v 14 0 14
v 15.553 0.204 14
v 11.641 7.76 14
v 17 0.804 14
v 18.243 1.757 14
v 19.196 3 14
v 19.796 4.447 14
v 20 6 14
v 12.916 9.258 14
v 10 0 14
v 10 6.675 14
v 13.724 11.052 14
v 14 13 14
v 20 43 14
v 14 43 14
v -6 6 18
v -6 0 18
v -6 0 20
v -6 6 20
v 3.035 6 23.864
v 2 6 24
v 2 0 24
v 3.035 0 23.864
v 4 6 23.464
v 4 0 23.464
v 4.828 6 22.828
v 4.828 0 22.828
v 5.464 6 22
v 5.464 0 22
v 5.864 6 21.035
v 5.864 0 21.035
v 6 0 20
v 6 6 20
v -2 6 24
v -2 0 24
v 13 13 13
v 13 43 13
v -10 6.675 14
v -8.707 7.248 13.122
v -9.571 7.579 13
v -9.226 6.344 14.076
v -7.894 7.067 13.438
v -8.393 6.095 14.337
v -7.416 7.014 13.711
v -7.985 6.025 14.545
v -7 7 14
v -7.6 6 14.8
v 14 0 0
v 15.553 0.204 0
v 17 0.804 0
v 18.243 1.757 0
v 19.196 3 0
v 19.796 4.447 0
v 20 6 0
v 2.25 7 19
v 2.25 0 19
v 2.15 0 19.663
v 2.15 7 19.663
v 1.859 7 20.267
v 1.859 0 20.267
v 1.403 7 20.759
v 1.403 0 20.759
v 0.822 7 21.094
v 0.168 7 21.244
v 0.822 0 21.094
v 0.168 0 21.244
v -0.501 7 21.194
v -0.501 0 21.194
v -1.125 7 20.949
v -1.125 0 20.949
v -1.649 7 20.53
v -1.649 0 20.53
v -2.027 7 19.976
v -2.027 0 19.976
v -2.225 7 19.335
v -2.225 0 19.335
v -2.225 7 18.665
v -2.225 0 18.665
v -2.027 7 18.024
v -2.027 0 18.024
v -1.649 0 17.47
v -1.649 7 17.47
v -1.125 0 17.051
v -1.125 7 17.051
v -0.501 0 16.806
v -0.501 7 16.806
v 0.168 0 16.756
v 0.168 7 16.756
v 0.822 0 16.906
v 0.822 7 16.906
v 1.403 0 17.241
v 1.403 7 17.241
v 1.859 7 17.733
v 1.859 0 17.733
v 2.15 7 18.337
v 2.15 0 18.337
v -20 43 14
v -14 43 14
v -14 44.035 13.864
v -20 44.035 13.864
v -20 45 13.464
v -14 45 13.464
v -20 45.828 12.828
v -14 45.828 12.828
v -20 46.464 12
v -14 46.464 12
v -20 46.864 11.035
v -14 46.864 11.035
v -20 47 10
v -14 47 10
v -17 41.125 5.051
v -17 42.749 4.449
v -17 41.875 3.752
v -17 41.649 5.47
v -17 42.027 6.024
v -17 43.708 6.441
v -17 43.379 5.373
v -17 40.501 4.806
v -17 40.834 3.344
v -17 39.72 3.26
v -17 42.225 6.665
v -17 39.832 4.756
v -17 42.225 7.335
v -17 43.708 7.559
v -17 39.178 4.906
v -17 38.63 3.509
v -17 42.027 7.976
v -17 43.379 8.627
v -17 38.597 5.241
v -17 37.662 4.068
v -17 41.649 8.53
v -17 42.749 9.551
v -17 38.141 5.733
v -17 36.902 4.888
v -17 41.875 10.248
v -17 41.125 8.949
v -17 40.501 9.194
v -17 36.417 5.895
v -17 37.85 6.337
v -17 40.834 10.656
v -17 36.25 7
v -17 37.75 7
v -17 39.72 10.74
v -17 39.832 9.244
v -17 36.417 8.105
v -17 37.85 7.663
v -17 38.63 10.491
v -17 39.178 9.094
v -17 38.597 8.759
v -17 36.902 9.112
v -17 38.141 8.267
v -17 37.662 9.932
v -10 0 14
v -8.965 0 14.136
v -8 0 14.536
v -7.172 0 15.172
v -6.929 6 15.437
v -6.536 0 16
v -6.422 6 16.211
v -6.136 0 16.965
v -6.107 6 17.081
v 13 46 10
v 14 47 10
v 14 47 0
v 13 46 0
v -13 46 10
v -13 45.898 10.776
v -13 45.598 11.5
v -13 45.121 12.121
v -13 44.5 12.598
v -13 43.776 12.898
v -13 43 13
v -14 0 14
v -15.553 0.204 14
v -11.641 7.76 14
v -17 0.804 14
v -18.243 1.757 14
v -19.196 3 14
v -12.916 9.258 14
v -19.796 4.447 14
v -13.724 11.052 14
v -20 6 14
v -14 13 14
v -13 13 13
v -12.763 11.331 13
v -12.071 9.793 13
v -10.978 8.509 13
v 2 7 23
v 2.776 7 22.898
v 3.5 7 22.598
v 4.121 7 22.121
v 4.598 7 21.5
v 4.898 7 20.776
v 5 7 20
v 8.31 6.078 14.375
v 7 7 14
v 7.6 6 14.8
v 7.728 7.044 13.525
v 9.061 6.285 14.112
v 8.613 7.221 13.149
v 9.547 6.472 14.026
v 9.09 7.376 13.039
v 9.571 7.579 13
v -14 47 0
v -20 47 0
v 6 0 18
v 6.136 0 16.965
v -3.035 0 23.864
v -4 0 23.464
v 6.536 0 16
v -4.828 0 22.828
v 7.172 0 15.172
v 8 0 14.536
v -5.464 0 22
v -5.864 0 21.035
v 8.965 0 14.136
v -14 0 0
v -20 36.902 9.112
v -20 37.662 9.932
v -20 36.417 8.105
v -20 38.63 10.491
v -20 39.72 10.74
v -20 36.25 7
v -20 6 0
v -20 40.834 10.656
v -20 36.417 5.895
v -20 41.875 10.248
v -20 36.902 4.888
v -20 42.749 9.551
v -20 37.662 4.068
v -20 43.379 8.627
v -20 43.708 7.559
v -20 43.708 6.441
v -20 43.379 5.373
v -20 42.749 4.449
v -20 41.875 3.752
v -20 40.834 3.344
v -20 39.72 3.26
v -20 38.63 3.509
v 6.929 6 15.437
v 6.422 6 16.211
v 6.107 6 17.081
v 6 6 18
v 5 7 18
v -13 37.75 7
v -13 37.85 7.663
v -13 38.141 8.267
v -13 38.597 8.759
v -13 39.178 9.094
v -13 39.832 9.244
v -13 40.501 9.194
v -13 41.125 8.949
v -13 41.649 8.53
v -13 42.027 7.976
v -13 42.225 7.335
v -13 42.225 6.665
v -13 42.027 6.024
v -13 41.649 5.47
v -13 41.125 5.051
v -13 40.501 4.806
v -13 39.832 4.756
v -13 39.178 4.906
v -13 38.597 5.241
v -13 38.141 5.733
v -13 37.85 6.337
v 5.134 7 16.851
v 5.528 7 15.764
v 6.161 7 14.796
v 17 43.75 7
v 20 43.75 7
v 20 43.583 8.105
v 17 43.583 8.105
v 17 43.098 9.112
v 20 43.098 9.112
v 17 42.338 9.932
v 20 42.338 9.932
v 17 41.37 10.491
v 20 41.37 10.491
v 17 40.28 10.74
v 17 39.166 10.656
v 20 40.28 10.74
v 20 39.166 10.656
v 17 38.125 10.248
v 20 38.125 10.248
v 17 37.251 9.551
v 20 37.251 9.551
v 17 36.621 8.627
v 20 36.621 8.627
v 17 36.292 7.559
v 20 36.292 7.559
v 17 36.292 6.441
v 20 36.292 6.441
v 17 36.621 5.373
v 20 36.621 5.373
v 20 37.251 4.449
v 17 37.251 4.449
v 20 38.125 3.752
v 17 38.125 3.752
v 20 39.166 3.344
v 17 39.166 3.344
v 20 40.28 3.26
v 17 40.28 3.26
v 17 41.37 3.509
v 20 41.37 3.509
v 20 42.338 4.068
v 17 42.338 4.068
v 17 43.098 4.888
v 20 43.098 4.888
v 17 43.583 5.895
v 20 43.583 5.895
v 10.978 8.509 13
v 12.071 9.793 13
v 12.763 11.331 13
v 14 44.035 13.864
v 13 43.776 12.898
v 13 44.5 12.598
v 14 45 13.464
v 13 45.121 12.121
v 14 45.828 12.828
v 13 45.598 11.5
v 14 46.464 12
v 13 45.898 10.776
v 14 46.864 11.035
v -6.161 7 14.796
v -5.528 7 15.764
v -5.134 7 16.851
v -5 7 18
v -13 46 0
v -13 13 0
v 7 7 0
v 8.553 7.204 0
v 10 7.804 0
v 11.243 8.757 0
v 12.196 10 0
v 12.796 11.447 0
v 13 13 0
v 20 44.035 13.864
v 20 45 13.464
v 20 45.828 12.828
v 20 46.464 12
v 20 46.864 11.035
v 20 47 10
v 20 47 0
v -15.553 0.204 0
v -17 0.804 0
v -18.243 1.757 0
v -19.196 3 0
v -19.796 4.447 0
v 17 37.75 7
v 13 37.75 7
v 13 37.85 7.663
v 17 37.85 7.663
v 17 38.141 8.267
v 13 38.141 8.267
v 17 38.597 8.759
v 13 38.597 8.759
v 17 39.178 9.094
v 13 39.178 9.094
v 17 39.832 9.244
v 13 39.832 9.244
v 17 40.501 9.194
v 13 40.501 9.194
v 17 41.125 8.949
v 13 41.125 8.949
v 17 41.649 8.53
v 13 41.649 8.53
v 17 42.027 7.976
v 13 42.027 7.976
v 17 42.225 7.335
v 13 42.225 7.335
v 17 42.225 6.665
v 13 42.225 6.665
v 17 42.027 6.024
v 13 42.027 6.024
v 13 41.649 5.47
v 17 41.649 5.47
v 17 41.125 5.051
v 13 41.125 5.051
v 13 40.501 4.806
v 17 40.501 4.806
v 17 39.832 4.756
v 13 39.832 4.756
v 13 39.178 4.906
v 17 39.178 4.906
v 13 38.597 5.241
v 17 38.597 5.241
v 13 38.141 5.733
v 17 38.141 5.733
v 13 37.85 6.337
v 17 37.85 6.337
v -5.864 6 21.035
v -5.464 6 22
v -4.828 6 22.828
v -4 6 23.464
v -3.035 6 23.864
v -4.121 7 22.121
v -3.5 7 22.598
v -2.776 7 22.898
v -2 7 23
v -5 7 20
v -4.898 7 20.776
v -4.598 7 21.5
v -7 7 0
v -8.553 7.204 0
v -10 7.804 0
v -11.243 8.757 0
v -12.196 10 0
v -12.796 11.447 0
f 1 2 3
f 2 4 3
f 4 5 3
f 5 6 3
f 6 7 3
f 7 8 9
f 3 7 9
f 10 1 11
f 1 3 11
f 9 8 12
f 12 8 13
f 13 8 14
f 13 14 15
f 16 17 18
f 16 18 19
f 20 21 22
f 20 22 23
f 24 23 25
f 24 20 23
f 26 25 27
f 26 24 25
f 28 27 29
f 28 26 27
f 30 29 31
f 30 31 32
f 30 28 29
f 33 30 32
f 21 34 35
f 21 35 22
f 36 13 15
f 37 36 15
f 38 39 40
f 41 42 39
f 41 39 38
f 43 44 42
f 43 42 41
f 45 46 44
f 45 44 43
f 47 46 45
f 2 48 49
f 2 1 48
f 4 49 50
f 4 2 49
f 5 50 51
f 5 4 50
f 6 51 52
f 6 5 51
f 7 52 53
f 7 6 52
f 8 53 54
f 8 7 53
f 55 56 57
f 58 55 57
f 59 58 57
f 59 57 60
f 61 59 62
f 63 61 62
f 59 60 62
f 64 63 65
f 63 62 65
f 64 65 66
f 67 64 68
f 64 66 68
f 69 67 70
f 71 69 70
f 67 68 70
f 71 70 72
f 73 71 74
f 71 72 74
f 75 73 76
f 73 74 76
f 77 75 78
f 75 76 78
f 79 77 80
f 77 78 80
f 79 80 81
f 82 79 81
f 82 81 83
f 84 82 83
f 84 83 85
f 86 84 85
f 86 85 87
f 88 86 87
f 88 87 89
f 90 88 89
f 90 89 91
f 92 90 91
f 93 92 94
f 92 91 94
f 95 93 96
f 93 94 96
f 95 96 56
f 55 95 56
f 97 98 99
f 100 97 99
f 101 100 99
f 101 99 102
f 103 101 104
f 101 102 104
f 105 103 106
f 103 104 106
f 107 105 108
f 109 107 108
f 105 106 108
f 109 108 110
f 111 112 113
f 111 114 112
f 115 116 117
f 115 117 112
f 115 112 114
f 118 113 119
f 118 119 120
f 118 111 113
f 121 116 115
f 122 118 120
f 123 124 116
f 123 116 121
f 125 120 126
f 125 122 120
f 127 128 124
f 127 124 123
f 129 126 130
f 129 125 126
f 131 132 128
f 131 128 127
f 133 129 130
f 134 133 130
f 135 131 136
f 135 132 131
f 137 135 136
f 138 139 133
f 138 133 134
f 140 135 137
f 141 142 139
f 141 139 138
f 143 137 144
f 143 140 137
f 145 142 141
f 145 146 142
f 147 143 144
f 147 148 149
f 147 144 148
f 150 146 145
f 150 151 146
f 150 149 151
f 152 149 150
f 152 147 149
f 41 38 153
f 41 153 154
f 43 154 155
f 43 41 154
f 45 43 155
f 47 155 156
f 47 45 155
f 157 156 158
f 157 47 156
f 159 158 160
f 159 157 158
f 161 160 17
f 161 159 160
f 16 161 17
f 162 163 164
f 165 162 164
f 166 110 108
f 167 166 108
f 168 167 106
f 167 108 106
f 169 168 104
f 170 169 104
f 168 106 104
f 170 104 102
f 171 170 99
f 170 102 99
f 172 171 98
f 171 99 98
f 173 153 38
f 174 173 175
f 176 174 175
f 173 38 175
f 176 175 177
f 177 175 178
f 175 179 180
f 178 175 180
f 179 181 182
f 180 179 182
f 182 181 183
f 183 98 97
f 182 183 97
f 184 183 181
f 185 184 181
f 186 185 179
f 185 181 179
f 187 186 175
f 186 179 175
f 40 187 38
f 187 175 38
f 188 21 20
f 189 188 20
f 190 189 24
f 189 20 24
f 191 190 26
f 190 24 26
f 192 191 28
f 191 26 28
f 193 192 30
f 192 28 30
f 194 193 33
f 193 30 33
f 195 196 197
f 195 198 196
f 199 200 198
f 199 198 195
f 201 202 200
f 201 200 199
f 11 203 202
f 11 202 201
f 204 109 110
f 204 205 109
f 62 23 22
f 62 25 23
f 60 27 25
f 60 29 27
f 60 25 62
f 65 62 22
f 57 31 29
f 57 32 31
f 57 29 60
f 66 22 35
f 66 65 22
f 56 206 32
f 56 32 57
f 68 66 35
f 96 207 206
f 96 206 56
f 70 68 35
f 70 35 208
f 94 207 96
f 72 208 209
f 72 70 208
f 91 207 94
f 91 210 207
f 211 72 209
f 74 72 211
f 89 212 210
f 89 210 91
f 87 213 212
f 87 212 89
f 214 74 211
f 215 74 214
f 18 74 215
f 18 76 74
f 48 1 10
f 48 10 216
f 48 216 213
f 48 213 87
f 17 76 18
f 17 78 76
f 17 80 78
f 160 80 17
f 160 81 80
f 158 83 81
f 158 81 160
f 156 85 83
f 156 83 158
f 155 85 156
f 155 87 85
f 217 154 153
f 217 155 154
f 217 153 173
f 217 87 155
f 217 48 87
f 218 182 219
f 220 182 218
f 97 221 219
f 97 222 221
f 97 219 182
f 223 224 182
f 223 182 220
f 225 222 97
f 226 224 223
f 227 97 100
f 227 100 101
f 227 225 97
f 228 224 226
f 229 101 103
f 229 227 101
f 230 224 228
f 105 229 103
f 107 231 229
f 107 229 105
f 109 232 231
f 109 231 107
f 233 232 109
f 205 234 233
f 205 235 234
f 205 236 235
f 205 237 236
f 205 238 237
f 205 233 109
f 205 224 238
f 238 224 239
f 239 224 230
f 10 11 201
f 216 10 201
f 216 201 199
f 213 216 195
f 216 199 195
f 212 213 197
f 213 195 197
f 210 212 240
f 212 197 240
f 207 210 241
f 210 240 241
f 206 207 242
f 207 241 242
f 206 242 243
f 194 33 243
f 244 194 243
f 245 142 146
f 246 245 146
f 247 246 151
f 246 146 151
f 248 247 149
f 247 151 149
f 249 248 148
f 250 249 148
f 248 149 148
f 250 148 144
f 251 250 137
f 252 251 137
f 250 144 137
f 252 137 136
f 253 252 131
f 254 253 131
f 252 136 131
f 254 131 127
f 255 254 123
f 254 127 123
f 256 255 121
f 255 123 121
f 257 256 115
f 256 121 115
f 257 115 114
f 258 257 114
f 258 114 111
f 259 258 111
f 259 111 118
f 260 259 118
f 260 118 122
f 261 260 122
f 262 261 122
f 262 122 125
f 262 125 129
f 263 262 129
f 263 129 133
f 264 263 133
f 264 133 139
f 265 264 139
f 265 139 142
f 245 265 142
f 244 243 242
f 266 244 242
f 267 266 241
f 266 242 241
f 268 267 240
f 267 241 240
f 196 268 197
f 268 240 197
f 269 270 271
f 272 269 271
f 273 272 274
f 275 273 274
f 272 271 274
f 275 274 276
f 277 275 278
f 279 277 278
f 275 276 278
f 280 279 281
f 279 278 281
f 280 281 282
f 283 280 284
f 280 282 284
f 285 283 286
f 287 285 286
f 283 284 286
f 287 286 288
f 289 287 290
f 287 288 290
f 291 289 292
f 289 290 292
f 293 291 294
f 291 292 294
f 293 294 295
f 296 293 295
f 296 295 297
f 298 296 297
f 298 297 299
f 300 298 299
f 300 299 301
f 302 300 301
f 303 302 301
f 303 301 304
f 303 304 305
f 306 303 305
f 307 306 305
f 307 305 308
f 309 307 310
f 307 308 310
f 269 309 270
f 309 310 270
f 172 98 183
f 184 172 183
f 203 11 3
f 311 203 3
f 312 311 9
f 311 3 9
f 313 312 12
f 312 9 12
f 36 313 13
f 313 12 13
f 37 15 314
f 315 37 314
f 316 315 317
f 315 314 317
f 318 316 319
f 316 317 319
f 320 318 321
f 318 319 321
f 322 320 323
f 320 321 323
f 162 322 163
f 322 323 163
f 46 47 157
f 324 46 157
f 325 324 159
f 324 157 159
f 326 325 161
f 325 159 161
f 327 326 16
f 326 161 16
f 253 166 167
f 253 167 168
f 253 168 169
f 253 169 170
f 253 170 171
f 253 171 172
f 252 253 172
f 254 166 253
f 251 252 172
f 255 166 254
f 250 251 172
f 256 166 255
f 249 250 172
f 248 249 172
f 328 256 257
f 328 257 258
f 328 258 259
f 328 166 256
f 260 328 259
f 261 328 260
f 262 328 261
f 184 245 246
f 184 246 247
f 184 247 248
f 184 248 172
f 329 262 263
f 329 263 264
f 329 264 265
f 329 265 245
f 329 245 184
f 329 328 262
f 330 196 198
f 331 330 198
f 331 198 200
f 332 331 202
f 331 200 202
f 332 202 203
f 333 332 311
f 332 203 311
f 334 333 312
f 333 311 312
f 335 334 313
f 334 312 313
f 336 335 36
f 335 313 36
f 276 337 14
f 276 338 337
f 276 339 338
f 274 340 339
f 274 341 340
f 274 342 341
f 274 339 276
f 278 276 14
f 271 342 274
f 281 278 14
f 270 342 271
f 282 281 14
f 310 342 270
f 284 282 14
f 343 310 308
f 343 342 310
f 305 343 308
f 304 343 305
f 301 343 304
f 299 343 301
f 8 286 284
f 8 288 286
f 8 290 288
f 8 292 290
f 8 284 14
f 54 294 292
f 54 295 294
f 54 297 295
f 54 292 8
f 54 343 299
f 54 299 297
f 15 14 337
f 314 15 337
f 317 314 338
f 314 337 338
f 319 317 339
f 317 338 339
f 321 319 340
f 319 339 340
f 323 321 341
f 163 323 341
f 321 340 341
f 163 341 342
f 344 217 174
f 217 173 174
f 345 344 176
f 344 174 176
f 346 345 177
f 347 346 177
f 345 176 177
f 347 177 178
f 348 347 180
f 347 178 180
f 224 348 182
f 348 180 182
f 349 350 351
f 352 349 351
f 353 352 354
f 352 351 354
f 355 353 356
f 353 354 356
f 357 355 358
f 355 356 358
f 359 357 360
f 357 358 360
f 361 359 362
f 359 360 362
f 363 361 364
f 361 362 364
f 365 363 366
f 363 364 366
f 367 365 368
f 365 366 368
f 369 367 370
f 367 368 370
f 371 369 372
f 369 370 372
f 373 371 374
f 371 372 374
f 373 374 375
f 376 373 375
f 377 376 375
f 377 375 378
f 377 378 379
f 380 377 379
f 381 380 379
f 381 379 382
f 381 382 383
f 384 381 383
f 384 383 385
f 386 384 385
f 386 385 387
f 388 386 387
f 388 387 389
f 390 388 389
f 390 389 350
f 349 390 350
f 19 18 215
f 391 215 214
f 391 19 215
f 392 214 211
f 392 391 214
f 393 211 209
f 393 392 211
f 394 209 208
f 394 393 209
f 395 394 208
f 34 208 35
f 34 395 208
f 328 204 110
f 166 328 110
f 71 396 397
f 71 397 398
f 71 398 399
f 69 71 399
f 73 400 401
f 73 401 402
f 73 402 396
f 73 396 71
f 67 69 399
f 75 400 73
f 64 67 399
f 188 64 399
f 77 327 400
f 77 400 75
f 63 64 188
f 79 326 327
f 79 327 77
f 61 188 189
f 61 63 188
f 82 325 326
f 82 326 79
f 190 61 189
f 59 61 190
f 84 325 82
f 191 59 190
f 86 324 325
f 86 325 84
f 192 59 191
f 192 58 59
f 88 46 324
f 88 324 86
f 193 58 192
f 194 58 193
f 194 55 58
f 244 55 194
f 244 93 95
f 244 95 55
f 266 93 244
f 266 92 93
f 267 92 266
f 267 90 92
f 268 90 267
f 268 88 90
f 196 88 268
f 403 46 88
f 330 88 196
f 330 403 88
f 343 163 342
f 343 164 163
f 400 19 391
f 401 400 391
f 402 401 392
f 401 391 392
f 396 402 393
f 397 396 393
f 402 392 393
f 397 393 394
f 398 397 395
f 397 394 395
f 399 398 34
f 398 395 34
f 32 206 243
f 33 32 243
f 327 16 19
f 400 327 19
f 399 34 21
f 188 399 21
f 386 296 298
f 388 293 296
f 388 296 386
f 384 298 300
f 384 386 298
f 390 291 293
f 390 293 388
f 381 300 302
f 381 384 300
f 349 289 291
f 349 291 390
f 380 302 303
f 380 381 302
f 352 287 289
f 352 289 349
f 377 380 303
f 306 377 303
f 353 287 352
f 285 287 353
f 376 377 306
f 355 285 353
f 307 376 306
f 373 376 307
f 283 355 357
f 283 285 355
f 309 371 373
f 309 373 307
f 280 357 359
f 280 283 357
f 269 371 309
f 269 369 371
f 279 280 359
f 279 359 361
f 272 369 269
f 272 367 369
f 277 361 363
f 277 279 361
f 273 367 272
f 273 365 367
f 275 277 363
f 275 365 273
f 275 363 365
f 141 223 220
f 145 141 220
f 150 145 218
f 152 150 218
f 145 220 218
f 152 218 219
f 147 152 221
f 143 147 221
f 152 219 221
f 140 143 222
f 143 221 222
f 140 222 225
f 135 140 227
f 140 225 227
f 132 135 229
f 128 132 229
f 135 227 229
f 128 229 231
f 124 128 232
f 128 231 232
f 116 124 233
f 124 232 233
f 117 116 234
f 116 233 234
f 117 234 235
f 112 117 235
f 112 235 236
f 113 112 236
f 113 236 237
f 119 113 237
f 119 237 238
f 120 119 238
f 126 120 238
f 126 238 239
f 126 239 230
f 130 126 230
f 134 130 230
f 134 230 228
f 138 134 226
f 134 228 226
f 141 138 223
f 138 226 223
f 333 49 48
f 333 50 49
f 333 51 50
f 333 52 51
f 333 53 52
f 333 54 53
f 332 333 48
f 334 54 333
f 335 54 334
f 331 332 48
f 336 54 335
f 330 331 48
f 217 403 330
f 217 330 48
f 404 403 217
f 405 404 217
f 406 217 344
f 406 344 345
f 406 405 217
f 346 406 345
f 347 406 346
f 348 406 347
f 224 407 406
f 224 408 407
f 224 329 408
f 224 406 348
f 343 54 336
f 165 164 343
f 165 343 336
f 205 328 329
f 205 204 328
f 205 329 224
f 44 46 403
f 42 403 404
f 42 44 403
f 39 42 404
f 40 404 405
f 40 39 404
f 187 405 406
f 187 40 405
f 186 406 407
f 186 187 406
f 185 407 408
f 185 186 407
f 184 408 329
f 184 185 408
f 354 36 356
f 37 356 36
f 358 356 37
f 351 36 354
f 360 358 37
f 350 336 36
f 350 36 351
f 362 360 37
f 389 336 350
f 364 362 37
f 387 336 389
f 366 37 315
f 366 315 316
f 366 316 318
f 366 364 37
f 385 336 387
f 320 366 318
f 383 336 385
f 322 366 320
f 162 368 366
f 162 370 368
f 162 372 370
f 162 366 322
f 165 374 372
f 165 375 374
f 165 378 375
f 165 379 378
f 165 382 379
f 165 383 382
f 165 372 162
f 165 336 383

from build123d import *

# Parameters (mm, degrees)
PAD_DEPTH       = 14
SKETCH001_W     = 12
SKETCH001_H     = 7
PAD001_DEPTH    = 10
FILLET_R        = 4
FILLET001_R     = 6
SKETCH002_R     = 2.25
POCKET_DEPTH    = 7
SKETCH003_R     = 2.25
POCKET001_DEPTH = 41
FILLET002_R     = 4
CHAMFER_SIZE    = 1
SKETCH004_R     = 3.75
POCKET002_DEPTH = 3
SKETCH005_R     = 3.75
POCKET003_DEPTH = 3


with BuildPart() as part:
    # Sketch → Pad (new body)
    with BuildSketch(Plane.XY):
        Polygon((-20, 47), (-13, 47), (-13, 7), (13, 7), (13, 47), (20, 47), (20, 0), (-20, 0), align=None)
    extrude(amount=PAD_DEPTH)

    # Sketch001 (on Face10 of Pad) → Pad001 (join)
    with BuildSketch(Plane.XY.offset(14)):
        with Locations((0, 3.5)):
            Rectangle(SKETCH001_W, SKETCH001_H)
    extrude(amount=PAD001_DEPTH)

    # Fillet
    fillet_edges = [part.edges().sort_by_distance(p)[0] for p in [
        (-6, 3.5, 14),
        (-6, 3.5, 24),
        (6, 3.5, 24),
        (6, 3.5, 14),
    ]]
    fillet(fillet_edges, radius=FILLET_R)

    # Fillet001
    fillet001_edges = [part.edges().sort_by_distance(p)[0] for p in [
        (20, 0, 7),
        (-20, 0, 7),
        (-13, 7, 7),
        (13, 7, 7),
    ]]
    fillet(fillet001_edges, radius=FILLET001_R)

    # Sketch002 (on Face4 of Fillet001) → Pocket (cut)
    with BuildSketch(Plane.XZ):
        with Locations((0, 19)):
            Circle(SKETCH002_R)
    extrude(amount=-POCKET_DEPTH, mode=Mode.SUBTRACT)

    # Sketch003 (on Face8 of Pocket) → Pocket001 (cut)
    with BuildSketch(Plane(origin=(-20, 0, 0), x_dir=(0, -1, 0), z_dir=(-1, 0, 0))):
        with Locations((-40, 7)):
            Circle(SKETCH003_R)
    extrude(amount=-POCKET001_DEPTH, mode=Mode.SUBTRACT)

    # Fillet002
    fillet002_edges = [part.edges().sort_by_distance(p)[0] for p in [
        (16.5, 47, 14),
        (-16.5, 47, 14),
    ]]
    fillet(fillet002_edges, radius=FILLET002_R)

    # Chamfer
    chamfer_edges = [part.edges().sort_by_distance(p)[0] for p in [
        (-13, 47, 5),
        (13, 47, 5),
    ]]
    chamfer(chamfer_edges, length=CHAMFER_SIZE)

    # Sketch004 (on Face4 of Chamfer) → Pocket002 (cut)
    with BuildSketch(Plane(origin=(-20, 0, 0), x_dir=(0, -1, 0), z_dir=(-1, 0, 0))):
        with Locations((-40, 7)):
            Circle(SKETCH004_R)
    extrude(amount=-POCKET002_DEPTH, mode=Mode.SUBTRACT)

    # Sketch005 (on Face33 of Pocket002) → Pocket003 (cut)
    with BuildSketch(Plane.YZ.offset(20)):
        with Locations((40, 7)):
            Circle(SKETCH005_R)
    extrude(amount=-POCKET003_DEPTH, mode=Mode.SUBTRACT)


solid = part.part
